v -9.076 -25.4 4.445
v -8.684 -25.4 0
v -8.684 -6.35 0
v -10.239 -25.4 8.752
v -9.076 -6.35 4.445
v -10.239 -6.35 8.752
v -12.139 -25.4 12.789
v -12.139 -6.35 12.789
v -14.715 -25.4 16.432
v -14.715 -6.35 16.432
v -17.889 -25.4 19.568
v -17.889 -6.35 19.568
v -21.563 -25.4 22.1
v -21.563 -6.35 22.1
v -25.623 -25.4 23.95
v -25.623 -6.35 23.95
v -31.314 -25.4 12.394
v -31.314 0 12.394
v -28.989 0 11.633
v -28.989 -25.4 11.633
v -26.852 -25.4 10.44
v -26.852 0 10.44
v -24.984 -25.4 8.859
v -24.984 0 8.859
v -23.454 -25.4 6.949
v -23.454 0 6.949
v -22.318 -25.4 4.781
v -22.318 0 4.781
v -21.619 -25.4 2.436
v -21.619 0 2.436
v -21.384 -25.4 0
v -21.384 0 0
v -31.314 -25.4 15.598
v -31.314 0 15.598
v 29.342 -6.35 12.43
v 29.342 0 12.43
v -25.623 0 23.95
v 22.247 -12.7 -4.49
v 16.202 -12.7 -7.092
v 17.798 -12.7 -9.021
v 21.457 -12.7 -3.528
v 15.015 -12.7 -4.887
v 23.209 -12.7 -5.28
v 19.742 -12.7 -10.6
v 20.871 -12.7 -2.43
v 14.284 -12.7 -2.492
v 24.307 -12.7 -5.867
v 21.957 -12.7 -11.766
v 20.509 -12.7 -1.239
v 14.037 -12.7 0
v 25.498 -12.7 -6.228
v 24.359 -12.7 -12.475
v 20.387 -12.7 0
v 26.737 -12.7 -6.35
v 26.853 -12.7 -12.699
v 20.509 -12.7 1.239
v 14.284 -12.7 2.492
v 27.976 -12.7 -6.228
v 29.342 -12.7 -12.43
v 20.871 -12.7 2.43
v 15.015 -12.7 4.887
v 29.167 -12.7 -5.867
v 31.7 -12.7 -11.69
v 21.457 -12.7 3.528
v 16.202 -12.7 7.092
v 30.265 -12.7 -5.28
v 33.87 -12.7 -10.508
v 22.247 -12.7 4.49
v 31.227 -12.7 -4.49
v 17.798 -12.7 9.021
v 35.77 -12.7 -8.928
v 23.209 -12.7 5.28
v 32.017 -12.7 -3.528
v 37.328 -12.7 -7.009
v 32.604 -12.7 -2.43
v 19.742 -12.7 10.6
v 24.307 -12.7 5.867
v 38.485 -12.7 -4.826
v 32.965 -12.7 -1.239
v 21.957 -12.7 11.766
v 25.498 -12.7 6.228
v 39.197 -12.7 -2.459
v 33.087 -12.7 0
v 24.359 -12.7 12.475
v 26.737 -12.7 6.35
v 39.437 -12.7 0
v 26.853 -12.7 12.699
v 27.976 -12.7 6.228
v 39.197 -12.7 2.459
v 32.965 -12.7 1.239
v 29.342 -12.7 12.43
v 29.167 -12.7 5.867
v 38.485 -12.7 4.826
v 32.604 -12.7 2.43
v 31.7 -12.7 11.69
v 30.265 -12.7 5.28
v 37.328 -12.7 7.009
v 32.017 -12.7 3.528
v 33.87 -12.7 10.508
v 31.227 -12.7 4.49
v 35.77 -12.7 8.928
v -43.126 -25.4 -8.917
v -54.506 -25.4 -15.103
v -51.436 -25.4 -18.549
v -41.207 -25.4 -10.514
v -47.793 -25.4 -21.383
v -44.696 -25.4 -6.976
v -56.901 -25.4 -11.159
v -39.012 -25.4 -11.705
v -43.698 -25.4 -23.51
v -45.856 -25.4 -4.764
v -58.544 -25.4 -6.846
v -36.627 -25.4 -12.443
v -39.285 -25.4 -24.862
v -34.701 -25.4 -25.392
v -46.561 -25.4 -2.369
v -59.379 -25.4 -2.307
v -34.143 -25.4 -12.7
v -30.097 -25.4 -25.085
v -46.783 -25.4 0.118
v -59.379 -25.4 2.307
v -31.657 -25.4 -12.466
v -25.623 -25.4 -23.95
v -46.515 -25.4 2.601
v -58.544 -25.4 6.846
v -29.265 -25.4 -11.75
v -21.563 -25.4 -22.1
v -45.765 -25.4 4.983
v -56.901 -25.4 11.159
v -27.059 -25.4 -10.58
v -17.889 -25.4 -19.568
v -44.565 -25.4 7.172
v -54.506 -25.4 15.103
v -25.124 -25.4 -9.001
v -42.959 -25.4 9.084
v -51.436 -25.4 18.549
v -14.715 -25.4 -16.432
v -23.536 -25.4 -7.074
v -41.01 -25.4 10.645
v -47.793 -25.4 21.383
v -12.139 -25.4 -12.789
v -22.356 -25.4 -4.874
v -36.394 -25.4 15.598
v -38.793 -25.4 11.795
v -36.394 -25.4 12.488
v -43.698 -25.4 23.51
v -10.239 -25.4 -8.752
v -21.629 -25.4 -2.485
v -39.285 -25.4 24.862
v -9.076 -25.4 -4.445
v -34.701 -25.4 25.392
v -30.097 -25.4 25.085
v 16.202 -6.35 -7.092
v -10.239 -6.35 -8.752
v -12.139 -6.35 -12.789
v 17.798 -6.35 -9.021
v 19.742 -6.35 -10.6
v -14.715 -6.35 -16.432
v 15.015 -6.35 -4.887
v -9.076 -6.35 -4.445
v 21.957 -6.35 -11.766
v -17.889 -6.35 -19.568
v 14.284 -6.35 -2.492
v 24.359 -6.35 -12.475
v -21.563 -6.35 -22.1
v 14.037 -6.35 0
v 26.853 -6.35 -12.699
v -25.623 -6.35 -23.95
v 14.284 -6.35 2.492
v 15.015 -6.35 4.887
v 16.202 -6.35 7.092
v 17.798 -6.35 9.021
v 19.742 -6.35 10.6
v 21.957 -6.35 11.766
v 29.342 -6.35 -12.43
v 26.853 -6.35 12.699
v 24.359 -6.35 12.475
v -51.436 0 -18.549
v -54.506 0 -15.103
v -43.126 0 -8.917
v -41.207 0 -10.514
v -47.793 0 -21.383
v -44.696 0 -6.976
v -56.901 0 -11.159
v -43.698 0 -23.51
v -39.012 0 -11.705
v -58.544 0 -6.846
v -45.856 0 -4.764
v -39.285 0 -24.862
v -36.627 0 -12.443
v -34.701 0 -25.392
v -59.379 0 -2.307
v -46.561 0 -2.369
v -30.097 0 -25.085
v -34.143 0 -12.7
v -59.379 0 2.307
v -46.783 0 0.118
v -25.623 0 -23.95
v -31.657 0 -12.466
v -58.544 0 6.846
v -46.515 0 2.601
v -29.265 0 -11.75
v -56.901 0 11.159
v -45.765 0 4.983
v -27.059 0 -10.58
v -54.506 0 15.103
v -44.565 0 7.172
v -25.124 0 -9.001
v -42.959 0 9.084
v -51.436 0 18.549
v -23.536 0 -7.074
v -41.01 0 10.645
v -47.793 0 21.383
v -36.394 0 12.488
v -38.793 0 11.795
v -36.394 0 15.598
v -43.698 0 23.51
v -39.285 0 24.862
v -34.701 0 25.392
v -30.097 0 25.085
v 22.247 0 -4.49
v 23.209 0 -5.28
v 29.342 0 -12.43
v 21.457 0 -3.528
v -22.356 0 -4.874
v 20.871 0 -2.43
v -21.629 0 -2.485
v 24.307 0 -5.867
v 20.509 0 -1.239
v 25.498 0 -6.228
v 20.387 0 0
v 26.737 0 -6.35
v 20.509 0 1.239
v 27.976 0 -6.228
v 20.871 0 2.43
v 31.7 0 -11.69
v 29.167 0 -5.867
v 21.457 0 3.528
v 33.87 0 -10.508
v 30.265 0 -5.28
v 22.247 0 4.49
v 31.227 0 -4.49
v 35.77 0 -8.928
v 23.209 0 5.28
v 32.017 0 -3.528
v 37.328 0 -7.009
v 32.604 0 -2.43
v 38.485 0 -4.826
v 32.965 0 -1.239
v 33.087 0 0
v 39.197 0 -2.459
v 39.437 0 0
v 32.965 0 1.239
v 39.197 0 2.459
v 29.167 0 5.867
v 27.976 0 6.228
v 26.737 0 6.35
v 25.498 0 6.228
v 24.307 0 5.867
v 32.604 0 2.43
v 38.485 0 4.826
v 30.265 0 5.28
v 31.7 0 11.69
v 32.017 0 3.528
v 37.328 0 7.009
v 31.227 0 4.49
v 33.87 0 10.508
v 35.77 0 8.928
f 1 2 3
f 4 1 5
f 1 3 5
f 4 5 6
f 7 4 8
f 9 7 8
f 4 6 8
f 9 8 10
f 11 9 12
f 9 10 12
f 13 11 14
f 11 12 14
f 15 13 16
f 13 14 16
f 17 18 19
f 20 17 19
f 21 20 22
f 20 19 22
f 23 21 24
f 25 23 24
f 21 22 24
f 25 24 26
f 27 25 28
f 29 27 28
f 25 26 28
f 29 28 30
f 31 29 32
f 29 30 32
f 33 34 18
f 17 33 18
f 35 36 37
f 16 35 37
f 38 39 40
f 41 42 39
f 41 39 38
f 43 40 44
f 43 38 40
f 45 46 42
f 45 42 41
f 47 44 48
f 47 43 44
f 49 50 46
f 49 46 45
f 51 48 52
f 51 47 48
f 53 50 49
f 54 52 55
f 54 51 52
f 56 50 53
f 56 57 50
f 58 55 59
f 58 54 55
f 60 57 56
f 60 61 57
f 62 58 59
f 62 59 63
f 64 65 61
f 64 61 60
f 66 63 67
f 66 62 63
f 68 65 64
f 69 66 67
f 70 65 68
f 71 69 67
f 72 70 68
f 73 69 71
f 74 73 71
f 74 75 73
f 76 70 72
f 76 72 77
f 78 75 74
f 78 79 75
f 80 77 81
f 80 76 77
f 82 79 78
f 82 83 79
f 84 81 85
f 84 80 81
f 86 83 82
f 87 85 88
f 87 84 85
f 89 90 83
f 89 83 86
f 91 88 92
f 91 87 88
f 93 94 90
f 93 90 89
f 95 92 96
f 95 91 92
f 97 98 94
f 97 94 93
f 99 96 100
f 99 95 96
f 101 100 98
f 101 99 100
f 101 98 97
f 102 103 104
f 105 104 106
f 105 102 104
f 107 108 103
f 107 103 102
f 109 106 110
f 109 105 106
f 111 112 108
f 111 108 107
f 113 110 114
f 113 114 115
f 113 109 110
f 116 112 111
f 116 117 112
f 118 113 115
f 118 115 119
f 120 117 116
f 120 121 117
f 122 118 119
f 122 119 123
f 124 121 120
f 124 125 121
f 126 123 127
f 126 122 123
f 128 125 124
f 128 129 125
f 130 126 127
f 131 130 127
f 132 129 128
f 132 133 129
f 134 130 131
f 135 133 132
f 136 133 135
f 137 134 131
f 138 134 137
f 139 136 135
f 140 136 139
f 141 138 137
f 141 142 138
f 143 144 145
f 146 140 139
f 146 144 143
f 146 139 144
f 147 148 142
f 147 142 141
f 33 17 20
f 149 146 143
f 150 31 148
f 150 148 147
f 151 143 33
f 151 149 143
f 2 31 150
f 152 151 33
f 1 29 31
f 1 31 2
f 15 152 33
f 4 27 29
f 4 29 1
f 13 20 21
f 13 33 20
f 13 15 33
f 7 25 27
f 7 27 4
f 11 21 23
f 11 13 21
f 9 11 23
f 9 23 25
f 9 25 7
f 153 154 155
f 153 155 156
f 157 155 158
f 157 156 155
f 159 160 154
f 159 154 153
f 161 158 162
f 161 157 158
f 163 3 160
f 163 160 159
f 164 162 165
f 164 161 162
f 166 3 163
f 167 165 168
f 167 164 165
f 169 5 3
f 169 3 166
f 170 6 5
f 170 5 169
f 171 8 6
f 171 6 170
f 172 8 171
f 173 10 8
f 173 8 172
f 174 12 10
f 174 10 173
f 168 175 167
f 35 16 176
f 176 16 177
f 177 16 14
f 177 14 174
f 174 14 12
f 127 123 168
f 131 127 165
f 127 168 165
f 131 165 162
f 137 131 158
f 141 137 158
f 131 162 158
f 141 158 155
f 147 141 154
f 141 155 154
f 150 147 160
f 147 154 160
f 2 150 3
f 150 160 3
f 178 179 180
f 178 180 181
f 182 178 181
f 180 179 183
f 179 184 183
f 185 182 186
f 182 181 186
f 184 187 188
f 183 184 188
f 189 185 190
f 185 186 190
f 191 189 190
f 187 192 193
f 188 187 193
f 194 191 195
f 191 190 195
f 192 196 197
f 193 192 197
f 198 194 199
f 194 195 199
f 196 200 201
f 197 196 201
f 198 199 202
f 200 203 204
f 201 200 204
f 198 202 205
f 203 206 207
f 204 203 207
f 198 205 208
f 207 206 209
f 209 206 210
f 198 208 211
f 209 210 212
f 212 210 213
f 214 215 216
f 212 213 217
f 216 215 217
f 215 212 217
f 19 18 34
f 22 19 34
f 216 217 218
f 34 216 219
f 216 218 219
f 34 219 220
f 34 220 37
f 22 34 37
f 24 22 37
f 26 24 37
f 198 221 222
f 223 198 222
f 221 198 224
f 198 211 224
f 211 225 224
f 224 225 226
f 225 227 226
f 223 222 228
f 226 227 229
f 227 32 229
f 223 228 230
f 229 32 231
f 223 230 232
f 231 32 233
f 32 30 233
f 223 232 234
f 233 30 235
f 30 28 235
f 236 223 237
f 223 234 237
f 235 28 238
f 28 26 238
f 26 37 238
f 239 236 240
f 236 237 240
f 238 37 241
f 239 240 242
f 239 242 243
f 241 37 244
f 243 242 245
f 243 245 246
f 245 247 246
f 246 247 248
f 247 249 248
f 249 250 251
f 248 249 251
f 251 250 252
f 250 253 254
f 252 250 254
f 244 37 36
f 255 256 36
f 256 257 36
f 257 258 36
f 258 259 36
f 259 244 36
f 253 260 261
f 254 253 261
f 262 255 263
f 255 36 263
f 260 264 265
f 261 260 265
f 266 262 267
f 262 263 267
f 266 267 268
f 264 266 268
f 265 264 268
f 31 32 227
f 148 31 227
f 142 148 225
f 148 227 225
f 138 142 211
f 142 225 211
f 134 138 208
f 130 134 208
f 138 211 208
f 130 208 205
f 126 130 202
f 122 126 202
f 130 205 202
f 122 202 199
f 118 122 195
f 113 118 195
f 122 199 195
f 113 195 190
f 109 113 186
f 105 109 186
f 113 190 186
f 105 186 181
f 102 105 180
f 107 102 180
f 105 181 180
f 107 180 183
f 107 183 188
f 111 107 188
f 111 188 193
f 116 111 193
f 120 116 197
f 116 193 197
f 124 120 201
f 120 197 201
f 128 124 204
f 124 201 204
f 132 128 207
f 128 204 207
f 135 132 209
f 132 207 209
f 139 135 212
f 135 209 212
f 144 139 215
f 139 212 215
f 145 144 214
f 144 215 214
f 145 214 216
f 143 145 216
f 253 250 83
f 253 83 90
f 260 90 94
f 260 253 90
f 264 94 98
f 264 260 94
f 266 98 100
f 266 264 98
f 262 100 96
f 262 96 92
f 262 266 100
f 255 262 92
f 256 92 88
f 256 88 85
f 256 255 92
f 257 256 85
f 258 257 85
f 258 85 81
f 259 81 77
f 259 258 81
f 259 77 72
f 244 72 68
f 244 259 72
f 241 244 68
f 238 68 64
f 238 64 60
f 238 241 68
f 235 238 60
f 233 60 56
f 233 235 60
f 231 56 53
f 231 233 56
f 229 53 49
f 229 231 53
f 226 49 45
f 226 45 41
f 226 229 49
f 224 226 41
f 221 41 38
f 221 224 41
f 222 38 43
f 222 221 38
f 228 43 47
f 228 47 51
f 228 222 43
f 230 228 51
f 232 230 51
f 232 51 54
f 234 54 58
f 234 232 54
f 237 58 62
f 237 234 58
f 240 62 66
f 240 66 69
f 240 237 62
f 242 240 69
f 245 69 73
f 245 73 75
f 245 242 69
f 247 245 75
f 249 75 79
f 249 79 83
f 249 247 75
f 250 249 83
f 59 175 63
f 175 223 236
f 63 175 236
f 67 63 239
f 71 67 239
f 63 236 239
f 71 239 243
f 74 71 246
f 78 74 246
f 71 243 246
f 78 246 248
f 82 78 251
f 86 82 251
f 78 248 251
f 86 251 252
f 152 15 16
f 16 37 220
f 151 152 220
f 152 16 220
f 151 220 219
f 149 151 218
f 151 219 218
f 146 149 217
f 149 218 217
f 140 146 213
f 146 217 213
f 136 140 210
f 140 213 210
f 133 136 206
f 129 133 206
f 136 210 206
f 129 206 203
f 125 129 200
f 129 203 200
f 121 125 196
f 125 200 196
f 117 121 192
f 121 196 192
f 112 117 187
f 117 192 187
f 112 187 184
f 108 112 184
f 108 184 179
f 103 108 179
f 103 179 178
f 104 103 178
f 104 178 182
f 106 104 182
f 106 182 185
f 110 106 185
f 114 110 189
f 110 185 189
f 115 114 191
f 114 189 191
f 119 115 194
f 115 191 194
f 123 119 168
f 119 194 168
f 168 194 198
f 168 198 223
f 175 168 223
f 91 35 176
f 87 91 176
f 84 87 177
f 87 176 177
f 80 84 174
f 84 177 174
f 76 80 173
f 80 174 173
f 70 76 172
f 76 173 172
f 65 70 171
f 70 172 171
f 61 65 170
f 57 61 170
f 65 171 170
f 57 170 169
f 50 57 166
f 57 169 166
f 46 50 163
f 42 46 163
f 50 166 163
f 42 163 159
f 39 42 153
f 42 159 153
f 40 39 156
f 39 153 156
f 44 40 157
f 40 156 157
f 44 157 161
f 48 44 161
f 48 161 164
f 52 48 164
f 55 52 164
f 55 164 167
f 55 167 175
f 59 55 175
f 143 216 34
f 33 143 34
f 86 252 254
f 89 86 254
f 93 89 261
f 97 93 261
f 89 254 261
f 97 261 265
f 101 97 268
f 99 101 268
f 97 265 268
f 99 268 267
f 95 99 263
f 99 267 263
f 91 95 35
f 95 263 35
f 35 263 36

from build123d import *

# Parameters (mm, degrees)
F1_DEPTH = 25.4
F2_DEPTH = 6.35
F0_R     = 6.35
F3_DEPTH = 12.7


with BuildPart() as f1:
    # F0 (on Front) → F1 (new body)
    with BuildSketch(Plane.XZ):
        with BuildLine():
            ThreePointArc((-25.623486, -23.949636), (-13.346651, -14.667498), (-8.683683, 0))
            ThreePointArc((-8.683683, 0), (-13.346651, 14.667498), (-25.623486, 23.949636))
            ThreePointArc((-25.623486, 23.949636), (-59.483683, 0), (-25.623486, -23.949636))
        make_face()
        with BuildLine():
            ThreePointArc((-31.31444, 12.394406), (-24.172594, 7.941052), (-21.383683, 0))
            ThreePointArc((-21.383683, 0), (-42.205979, -9.763109), (-36.39444, 12.48801))
            Line((-36.39444, 12.48801), (-36.39444, 15.597617))
            Line((-36.39444, 15.597617), (-31.31444, 15.597617))
            Line((-31.31444, 15.597617), (-31.31444, 12.394406))
        make_face(mode=Mode.SUBTRACT)
    extrude(amount=F1_DEPTH)

    # F0 (on Front) → F2 (join)
    with BuildSketch(Plane.XZ):
        with BuildLine():
            ThreePointArc((-25.623486, 23.949636), (-13.346651, 14.667498), (-8.683683, 0))
            ThreePointArc((-8.683683, 0), (-13.346651, -14.667498), (-25.623486, -23.949636))
            Line((-25.623486, -23.949636), (29.342367, -12.429951))
            ThreePointArc((29.342367, -12.429951), (14.037311, 0), (29.342367, 12.429951))
            Line((29.342367, 12.429951), (-25.623486, 23.949636))
        make_face()
    extrude(amount=F2_DEPTH)

    # F0 (on Front) → F3 (join)
    with BuildSketch(Plane.XZ):
        with BuildLine():
            ThreePointArc((39.437311, 0), (36.595664, 8.006428), (29.342367, 12.429951))
            ThreePointArc((29.342367, 12.429951), (14.037311, 0), (29.342367, -12.429951))
            ThreePointArc((29.342367, -12.429951), (36.595664, -8.006428), (39.437311, 0))
        make_face()
        with Locations((26.737311, 0)):
            Circle(F0_R, mode=Mode.SUBTRACT)
    extrude(amount=F3_DEPTH)


solid = f1.part
